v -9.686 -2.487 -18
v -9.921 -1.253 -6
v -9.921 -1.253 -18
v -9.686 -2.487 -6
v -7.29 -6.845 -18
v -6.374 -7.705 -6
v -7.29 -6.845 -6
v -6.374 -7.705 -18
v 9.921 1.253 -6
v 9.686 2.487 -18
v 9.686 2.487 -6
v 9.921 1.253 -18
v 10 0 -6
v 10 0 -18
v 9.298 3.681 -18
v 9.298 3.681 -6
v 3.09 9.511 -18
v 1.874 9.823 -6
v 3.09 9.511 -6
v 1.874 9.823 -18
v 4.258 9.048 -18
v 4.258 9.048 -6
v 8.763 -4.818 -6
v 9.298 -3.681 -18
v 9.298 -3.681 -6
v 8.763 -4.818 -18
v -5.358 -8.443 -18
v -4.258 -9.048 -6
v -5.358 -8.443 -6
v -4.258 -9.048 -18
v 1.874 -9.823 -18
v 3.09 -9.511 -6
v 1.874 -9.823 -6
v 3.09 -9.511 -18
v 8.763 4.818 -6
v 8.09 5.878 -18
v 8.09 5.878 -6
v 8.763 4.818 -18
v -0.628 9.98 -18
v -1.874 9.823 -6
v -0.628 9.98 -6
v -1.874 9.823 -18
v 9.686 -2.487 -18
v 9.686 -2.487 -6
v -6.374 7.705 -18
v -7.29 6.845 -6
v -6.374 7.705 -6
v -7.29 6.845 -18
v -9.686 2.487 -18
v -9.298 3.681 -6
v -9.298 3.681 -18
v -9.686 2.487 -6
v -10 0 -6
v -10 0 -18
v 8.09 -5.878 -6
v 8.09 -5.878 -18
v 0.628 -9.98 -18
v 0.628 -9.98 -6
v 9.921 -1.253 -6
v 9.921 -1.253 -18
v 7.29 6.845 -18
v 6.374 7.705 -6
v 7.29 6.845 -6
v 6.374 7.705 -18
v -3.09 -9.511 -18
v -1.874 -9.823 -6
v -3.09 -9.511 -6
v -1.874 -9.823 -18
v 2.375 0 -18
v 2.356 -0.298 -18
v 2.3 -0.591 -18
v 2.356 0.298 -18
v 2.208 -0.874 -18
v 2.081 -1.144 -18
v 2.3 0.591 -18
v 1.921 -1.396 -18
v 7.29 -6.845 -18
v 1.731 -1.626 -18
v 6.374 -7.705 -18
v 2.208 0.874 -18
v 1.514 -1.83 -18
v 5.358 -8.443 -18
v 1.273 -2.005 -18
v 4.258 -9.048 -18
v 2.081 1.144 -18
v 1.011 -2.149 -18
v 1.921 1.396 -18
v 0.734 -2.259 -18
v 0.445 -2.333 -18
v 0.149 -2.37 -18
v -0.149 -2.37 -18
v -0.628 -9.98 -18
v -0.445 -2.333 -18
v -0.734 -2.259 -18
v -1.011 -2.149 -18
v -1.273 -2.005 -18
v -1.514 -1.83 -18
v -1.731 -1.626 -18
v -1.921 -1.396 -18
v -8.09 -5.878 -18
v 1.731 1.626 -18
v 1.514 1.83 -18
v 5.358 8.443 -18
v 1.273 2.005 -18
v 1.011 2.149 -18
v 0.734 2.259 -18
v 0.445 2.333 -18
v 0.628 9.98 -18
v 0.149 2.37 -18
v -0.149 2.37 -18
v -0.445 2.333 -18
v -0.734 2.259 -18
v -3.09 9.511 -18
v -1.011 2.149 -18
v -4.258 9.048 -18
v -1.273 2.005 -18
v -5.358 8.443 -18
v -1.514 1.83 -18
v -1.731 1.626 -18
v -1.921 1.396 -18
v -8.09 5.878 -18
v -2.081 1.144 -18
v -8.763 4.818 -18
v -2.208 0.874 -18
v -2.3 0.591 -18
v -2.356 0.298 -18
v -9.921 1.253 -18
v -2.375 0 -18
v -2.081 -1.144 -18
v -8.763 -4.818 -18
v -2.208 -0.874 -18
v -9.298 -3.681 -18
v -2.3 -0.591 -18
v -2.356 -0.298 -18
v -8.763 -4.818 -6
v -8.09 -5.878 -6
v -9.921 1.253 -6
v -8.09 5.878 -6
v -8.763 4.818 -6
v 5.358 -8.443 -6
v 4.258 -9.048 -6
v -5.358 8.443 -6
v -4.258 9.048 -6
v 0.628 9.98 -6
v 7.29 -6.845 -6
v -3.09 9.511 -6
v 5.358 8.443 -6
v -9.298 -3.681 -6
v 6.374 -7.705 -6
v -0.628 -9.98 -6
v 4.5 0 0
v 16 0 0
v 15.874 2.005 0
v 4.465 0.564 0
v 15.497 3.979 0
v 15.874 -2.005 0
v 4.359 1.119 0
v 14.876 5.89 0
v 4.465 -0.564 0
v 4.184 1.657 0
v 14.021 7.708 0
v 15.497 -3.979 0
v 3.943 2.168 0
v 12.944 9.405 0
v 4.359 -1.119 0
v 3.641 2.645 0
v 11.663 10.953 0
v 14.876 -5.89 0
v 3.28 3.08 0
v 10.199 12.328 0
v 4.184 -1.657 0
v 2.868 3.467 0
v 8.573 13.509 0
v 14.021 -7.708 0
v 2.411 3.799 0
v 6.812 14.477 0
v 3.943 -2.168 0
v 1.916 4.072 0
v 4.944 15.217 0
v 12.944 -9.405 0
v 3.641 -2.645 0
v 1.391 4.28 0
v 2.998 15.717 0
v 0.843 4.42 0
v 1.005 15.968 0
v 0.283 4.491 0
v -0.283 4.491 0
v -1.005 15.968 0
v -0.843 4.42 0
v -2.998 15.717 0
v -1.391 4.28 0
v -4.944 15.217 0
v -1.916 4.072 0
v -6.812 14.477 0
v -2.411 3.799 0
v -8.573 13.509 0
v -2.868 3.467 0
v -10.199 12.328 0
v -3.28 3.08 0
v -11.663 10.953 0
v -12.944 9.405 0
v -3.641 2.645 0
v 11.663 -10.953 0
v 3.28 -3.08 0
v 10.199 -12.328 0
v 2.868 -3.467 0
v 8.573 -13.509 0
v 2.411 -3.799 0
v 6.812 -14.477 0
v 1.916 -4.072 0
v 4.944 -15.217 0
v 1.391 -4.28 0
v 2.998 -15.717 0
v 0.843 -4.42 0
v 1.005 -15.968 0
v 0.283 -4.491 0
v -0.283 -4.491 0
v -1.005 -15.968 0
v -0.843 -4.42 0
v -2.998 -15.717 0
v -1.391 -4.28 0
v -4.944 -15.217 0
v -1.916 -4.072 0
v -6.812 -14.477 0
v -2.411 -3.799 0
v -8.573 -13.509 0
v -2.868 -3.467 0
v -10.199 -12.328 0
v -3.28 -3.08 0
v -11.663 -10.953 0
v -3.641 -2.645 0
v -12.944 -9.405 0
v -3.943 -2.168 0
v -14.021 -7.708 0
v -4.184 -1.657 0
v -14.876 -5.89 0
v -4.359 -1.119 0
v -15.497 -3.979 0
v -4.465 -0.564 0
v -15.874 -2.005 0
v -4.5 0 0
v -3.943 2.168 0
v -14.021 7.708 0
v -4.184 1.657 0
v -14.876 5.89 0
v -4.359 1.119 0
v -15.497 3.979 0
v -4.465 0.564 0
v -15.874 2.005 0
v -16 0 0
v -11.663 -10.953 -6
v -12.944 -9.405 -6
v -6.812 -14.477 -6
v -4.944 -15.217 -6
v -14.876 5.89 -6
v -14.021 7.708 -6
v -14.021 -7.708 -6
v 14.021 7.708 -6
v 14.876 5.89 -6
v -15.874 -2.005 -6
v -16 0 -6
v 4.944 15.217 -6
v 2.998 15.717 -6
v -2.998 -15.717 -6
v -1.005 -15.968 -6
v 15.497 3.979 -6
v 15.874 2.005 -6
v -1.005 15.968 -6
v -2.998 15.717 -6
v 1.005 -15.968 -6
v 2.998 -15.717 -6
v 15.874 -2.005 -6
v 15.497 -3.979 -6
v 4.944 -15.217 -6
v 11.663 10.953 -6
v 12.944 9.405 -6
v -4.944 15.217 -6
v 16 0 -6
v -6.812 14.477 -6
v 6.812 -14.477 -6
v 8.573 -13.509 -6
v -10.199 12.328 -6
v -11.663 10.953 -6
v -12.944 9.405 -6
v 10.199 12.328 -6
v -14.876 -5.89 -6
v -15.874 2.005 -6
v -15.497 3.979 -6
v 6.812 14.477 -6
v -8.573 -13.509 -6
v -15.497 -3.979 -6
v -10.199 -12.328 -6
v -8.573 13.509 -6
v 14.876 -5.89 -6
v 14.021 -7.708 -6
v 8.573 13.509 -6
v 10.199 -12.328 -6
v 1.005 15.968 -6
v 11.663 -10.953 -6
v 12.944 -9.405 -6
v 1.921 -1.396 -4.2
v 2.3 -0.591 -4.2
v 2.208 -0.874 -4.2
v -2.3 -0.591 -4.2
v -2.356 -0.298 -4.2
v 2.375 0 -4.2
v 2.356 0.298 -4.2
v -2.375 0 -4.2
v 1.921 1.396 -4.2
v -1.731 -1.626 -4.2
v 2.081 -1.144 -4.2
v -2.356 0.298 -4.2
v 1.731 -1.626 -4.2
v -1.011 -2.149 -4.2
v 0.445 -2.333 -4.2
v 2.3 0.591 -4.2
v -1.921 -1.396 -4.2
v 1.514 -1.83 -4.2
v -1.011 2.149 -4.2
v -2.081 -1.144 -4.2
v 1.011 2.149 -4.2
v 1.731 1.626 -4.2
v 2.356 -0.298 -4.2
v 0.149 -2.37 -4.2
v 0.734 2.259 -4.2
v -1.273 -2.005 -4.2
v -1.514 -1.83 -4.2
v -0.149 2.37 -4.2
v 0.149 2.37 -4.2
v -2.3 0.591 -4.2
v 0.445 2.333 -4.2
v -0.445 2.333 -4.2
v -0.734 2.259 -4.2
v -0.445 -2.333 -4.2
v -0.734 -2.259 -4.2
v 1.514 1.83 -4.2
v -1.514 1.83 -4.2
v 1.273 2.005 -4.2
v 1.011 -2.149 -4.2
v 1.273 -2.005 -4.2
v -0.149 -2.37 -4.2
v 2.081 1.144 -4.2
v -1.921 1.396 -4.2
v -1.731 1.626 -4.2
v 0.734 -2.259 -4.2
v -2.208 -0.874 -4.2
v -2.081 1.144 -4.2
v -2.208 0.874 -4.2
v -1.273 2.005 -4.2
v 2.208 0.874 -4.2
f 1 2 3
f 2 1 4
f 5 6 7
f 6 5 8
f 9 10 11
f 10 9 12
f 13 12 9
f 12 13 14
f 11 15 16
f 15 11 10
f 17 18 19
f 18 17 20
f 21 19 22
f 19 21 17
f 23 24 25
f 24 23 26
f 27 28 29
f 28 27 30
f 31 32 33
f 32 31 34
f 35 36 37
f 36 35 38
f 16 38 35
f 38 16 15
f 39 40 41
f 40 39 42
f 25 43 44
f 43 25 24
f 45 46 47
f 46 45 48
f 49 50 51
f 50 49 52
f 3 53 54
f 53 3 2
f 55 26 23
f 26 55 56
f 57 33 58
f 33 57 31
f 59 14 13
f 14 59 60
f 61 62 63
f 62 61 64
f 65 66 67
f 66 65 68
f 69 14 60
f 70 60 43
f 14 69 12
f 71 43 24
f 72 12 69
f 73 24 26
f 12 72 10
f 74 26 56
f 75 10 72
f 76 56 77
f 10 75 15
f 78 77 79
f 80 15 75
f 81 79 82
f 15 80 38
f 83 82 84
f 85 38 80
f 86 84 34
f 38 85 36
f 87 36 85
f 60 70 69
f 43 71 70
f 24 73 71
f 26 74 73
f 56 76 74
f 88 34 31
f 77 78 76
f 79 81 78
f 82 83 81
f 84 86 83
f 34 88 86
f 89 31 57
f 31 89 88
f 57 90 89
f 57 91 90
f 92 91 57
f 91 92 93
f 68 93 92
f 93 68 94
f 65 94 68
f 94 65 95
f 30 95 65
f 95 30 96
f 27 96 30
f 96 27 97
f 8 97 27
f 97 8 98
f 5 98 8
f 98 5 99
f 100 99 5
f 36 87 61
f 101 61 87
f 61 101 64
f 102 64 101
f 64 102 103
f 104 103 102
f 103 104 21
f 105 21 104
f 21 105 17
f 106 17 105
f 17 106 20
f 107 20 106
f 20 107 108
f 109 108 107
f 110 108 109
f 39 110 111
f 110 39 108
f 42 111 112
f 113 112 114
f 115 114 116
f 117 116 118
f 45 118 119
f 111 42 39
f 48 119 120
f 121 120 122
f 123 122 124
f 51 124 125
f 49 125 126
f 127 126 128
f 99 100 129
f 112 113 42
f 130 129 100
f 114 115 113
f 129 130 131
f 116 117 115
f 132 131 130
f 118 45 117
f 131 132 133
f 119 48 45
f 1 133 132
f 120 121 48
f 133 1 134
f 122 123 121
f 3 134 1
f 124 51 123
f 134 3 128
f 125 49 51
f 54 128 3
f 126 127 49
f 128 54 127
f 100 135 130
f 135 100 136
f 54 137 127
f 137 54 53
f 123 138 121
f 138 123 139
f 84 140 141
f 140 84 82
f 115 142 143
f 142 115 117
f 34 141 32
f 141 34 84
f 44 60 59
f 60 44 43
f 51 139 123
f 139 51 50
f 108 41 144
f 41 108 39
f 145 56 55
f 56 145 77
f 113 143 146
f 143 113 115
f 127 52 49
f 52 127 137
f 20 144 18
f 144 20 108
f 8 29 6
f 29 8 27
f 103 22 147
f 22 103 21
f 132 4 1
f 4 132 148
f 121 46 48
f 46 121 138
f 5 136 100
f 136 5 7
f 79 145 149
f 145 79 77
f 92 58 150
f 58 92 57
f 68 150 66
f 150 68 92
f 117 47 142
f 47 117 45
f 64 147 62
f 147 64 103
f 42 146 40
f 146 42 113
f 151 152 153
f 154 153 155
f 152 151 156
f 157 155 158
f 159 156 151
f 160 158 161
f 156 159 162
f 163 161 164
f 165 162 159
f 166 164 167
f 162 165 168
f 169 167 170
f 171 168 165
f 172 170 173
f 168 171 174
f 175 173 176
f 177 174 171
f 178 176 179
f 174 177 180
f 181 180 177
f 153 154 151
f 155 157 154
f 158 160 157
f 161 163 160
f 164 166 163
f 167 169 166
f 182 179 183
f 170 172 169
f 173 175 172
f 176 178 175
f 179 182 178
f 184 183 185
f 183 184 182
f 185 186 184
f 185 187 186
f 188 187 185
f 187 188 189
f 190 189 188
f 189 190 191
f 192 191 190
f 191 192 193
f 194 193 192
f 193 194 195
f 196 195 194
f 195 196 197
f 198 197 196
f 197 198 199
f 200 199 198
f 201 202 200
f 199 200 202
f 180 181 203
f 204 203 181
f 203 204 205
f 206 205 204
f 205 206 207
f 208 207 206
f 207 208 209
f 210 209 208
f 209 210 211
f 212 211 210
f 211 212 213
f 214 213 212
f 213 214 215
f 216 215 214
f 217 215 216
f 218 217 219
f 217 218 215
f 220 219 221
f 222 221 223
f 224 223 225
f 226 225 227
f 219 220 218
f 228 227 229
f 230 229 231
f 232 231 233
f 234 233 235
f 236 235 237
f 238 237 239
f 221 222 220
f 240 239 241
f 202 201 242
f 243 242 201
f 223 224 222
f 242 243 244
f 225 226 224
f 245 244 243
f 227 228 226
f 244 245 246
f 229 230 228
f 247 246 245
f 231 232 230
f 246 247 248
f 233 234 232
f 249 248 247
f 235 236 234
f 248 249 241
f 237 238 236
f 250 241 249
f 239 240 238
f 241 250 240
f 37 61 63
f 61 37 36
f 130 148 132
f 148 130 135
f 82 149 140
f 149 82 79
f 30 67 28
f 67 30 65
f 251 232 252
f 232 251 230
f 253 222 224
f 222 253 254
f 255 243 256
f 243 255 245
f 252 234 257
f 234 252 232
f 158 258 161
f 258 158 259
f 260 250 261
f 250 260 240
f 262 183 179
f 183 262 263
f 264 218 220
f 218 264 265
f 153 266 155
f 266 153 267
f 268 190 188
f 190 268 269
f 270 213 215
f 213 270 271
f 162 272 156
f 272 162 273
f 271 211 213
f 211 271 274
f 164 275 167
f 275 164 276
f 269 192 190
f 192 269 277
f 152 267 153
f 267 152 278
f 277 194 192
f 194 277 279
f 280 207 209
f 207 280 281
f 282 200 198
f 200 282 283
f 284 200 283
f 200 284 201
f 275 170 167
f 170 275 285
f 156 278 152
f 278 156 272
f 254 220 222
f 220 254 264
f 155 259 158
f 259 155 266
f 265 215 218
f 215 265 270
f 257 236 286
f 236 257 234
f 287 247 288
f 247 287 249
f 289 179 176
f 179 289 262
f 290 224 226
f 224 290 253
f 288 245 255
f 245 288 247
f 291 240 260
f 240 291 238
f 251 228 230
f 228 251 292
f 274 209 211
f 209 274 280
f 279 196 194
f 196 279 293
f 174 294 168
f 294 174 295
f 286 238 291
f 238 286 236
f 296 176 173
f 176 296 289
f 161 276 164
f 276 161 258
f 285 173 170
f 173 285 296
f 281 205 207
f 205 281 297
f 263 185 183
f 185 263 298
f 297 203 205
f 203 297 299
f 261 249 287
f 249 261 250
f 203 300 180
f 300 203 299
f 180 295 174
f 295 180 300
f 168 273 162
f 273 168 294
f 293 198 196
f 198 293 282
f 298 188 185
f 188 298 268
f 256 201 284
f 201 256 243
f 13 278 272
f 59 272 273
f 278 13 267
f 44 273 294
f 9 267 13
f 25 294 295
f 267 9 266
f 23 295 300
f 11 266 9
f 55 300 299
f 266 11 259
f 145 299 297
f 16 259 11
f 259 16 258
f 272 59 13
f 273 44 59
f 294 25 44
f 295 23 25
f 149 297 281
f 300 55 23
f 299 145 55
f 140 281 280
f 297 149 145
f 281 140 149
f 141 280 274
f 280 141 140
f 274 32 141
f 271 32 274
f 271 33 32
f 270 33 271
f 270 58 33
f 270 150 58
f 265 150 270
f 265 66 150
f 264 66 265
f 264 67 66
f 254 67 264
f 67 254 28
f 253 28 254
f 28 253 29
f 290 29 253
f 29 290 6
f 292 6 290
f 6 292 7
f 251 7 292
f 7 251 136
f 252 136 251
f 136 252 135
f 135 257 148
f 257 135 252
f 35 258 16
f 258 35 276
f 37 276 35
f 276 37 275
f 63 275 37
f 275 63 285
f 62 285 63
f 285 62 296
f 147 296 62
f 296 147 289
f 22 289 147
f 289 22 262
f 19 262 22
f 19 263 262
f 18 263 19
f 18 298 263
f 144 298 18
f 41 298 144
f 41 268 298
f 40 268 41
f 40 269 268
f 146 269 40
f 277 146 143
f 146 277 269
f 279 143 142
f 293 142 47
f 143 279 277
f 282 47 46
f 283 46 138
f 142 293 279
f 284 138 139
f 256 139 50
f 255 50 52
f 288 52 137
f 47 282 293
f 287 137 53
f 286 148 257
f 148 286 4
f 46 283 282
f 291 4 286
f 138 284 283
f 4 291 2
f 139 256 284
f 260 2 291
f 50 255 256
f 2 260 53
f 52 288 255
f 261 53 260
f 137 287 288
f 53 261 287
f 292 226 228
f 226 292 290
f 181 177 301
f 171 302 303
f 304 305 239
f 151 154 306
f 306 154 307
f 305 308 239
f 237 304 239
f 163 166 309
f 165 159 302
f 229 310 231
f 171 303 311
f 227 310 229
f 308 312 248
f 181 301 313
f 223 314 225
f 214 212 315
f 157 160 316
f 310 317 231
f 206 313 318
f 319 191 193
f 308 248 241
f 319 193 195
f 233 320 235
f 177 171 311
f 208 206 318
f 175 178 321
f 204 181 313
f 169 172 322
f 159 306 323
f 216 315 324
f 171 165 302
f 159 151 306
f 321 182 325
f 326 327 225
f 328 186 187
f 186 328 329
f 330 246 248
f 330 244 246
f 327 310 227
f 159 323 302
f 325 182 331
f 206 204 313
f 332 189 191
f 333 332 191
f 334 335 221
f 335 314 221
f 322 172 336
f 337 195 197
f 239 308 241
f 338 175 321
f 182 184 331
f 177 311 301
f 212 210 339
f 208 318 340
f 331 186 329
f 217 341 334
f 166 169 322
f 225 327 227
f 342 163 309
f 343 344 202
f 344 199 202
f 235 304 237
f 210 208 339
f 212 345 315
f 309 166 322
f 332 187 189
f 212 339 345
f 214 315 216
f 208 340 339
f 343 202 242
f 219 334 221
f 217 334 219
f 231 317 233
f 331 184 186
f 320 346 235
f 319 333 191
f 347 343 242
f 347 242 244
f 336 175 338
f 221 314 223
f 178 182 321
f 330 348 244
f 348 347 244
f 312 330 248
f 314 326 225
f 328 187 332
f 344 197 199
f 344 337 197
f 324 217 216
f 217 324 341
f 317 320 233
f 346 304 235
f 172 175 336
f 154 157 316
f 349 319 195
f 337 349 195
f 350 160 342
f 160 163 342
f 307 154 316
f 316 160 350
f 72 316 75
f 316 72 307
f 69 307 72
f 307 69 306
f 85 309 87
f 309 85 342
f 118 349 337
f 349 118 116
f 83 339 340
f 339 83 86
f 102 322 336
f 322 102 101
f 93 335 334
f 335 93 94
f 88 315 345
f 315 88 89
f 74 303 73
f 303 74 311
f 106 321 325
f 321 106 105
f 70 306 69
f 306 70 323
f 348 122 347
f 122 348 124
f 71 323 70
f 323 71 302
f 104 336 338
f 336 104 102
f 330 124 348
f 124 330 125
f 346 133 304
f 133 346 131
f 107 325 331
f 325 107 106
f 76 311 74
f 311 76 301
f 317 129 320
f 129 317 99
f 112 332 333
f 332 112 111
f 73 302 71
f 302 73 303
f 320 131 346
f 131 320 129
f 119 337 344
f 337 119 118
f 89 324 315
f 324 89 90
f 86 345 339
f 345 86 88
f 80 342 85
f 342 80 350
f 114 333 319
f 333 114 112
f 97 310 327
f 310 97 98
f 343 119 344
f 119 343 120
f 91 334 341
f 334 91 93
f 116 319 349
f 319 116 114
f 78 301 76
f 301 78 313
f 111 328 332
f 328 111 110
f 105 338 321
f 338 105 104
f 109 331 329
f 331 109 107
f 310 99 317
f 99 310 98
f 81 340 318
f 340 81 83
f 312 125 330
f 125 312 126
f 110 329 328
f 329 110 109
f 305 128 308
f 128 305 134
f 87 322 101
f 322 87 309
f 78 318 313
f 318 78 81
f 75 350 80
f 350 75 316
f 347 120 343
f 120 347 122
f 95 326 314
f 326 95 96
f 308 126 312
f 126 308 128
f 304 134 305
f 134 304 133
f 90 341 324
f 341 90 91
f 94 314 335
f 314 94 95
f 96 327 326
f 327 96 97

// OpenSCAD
$fn = 50;


difference() {
	union() {
		translate(v = [0, 0, -18.0000000000]) {
			cylinder(h = 18, r = 10.0000000000);
		}
		translate(v = [0, 0, -6.0000000000]) {
			cylinder(h = 6, r = 16.0000000000);
		}
	}
	union() {
		translate(v = [0, 0, 0]) {
			rotate(a = [0, 0, 0]) {
				difference() {
					union() {
						#translate(v = [0, 0, -18.0000000000]) {
							cylinder(h = 18, r = 2.2500000000);
						}
						#translate(v = [0, 0, -4.2000000000]) {
							cylinder(h = 4.2000000000, r1 = 2.3750000000, r2 = 4.5000000000);
						}
						#translate(v = [0, 0, -18.0000000000]) {
							cylinder(h = 18, r = 2.3750000000);
						}
						#translate(v = [0, 0, -18.0000000000]) {
							cylinder(h = 18, r = 2.2500000000);
						}
					}
					union();
				}
			}
		}
	}
}
